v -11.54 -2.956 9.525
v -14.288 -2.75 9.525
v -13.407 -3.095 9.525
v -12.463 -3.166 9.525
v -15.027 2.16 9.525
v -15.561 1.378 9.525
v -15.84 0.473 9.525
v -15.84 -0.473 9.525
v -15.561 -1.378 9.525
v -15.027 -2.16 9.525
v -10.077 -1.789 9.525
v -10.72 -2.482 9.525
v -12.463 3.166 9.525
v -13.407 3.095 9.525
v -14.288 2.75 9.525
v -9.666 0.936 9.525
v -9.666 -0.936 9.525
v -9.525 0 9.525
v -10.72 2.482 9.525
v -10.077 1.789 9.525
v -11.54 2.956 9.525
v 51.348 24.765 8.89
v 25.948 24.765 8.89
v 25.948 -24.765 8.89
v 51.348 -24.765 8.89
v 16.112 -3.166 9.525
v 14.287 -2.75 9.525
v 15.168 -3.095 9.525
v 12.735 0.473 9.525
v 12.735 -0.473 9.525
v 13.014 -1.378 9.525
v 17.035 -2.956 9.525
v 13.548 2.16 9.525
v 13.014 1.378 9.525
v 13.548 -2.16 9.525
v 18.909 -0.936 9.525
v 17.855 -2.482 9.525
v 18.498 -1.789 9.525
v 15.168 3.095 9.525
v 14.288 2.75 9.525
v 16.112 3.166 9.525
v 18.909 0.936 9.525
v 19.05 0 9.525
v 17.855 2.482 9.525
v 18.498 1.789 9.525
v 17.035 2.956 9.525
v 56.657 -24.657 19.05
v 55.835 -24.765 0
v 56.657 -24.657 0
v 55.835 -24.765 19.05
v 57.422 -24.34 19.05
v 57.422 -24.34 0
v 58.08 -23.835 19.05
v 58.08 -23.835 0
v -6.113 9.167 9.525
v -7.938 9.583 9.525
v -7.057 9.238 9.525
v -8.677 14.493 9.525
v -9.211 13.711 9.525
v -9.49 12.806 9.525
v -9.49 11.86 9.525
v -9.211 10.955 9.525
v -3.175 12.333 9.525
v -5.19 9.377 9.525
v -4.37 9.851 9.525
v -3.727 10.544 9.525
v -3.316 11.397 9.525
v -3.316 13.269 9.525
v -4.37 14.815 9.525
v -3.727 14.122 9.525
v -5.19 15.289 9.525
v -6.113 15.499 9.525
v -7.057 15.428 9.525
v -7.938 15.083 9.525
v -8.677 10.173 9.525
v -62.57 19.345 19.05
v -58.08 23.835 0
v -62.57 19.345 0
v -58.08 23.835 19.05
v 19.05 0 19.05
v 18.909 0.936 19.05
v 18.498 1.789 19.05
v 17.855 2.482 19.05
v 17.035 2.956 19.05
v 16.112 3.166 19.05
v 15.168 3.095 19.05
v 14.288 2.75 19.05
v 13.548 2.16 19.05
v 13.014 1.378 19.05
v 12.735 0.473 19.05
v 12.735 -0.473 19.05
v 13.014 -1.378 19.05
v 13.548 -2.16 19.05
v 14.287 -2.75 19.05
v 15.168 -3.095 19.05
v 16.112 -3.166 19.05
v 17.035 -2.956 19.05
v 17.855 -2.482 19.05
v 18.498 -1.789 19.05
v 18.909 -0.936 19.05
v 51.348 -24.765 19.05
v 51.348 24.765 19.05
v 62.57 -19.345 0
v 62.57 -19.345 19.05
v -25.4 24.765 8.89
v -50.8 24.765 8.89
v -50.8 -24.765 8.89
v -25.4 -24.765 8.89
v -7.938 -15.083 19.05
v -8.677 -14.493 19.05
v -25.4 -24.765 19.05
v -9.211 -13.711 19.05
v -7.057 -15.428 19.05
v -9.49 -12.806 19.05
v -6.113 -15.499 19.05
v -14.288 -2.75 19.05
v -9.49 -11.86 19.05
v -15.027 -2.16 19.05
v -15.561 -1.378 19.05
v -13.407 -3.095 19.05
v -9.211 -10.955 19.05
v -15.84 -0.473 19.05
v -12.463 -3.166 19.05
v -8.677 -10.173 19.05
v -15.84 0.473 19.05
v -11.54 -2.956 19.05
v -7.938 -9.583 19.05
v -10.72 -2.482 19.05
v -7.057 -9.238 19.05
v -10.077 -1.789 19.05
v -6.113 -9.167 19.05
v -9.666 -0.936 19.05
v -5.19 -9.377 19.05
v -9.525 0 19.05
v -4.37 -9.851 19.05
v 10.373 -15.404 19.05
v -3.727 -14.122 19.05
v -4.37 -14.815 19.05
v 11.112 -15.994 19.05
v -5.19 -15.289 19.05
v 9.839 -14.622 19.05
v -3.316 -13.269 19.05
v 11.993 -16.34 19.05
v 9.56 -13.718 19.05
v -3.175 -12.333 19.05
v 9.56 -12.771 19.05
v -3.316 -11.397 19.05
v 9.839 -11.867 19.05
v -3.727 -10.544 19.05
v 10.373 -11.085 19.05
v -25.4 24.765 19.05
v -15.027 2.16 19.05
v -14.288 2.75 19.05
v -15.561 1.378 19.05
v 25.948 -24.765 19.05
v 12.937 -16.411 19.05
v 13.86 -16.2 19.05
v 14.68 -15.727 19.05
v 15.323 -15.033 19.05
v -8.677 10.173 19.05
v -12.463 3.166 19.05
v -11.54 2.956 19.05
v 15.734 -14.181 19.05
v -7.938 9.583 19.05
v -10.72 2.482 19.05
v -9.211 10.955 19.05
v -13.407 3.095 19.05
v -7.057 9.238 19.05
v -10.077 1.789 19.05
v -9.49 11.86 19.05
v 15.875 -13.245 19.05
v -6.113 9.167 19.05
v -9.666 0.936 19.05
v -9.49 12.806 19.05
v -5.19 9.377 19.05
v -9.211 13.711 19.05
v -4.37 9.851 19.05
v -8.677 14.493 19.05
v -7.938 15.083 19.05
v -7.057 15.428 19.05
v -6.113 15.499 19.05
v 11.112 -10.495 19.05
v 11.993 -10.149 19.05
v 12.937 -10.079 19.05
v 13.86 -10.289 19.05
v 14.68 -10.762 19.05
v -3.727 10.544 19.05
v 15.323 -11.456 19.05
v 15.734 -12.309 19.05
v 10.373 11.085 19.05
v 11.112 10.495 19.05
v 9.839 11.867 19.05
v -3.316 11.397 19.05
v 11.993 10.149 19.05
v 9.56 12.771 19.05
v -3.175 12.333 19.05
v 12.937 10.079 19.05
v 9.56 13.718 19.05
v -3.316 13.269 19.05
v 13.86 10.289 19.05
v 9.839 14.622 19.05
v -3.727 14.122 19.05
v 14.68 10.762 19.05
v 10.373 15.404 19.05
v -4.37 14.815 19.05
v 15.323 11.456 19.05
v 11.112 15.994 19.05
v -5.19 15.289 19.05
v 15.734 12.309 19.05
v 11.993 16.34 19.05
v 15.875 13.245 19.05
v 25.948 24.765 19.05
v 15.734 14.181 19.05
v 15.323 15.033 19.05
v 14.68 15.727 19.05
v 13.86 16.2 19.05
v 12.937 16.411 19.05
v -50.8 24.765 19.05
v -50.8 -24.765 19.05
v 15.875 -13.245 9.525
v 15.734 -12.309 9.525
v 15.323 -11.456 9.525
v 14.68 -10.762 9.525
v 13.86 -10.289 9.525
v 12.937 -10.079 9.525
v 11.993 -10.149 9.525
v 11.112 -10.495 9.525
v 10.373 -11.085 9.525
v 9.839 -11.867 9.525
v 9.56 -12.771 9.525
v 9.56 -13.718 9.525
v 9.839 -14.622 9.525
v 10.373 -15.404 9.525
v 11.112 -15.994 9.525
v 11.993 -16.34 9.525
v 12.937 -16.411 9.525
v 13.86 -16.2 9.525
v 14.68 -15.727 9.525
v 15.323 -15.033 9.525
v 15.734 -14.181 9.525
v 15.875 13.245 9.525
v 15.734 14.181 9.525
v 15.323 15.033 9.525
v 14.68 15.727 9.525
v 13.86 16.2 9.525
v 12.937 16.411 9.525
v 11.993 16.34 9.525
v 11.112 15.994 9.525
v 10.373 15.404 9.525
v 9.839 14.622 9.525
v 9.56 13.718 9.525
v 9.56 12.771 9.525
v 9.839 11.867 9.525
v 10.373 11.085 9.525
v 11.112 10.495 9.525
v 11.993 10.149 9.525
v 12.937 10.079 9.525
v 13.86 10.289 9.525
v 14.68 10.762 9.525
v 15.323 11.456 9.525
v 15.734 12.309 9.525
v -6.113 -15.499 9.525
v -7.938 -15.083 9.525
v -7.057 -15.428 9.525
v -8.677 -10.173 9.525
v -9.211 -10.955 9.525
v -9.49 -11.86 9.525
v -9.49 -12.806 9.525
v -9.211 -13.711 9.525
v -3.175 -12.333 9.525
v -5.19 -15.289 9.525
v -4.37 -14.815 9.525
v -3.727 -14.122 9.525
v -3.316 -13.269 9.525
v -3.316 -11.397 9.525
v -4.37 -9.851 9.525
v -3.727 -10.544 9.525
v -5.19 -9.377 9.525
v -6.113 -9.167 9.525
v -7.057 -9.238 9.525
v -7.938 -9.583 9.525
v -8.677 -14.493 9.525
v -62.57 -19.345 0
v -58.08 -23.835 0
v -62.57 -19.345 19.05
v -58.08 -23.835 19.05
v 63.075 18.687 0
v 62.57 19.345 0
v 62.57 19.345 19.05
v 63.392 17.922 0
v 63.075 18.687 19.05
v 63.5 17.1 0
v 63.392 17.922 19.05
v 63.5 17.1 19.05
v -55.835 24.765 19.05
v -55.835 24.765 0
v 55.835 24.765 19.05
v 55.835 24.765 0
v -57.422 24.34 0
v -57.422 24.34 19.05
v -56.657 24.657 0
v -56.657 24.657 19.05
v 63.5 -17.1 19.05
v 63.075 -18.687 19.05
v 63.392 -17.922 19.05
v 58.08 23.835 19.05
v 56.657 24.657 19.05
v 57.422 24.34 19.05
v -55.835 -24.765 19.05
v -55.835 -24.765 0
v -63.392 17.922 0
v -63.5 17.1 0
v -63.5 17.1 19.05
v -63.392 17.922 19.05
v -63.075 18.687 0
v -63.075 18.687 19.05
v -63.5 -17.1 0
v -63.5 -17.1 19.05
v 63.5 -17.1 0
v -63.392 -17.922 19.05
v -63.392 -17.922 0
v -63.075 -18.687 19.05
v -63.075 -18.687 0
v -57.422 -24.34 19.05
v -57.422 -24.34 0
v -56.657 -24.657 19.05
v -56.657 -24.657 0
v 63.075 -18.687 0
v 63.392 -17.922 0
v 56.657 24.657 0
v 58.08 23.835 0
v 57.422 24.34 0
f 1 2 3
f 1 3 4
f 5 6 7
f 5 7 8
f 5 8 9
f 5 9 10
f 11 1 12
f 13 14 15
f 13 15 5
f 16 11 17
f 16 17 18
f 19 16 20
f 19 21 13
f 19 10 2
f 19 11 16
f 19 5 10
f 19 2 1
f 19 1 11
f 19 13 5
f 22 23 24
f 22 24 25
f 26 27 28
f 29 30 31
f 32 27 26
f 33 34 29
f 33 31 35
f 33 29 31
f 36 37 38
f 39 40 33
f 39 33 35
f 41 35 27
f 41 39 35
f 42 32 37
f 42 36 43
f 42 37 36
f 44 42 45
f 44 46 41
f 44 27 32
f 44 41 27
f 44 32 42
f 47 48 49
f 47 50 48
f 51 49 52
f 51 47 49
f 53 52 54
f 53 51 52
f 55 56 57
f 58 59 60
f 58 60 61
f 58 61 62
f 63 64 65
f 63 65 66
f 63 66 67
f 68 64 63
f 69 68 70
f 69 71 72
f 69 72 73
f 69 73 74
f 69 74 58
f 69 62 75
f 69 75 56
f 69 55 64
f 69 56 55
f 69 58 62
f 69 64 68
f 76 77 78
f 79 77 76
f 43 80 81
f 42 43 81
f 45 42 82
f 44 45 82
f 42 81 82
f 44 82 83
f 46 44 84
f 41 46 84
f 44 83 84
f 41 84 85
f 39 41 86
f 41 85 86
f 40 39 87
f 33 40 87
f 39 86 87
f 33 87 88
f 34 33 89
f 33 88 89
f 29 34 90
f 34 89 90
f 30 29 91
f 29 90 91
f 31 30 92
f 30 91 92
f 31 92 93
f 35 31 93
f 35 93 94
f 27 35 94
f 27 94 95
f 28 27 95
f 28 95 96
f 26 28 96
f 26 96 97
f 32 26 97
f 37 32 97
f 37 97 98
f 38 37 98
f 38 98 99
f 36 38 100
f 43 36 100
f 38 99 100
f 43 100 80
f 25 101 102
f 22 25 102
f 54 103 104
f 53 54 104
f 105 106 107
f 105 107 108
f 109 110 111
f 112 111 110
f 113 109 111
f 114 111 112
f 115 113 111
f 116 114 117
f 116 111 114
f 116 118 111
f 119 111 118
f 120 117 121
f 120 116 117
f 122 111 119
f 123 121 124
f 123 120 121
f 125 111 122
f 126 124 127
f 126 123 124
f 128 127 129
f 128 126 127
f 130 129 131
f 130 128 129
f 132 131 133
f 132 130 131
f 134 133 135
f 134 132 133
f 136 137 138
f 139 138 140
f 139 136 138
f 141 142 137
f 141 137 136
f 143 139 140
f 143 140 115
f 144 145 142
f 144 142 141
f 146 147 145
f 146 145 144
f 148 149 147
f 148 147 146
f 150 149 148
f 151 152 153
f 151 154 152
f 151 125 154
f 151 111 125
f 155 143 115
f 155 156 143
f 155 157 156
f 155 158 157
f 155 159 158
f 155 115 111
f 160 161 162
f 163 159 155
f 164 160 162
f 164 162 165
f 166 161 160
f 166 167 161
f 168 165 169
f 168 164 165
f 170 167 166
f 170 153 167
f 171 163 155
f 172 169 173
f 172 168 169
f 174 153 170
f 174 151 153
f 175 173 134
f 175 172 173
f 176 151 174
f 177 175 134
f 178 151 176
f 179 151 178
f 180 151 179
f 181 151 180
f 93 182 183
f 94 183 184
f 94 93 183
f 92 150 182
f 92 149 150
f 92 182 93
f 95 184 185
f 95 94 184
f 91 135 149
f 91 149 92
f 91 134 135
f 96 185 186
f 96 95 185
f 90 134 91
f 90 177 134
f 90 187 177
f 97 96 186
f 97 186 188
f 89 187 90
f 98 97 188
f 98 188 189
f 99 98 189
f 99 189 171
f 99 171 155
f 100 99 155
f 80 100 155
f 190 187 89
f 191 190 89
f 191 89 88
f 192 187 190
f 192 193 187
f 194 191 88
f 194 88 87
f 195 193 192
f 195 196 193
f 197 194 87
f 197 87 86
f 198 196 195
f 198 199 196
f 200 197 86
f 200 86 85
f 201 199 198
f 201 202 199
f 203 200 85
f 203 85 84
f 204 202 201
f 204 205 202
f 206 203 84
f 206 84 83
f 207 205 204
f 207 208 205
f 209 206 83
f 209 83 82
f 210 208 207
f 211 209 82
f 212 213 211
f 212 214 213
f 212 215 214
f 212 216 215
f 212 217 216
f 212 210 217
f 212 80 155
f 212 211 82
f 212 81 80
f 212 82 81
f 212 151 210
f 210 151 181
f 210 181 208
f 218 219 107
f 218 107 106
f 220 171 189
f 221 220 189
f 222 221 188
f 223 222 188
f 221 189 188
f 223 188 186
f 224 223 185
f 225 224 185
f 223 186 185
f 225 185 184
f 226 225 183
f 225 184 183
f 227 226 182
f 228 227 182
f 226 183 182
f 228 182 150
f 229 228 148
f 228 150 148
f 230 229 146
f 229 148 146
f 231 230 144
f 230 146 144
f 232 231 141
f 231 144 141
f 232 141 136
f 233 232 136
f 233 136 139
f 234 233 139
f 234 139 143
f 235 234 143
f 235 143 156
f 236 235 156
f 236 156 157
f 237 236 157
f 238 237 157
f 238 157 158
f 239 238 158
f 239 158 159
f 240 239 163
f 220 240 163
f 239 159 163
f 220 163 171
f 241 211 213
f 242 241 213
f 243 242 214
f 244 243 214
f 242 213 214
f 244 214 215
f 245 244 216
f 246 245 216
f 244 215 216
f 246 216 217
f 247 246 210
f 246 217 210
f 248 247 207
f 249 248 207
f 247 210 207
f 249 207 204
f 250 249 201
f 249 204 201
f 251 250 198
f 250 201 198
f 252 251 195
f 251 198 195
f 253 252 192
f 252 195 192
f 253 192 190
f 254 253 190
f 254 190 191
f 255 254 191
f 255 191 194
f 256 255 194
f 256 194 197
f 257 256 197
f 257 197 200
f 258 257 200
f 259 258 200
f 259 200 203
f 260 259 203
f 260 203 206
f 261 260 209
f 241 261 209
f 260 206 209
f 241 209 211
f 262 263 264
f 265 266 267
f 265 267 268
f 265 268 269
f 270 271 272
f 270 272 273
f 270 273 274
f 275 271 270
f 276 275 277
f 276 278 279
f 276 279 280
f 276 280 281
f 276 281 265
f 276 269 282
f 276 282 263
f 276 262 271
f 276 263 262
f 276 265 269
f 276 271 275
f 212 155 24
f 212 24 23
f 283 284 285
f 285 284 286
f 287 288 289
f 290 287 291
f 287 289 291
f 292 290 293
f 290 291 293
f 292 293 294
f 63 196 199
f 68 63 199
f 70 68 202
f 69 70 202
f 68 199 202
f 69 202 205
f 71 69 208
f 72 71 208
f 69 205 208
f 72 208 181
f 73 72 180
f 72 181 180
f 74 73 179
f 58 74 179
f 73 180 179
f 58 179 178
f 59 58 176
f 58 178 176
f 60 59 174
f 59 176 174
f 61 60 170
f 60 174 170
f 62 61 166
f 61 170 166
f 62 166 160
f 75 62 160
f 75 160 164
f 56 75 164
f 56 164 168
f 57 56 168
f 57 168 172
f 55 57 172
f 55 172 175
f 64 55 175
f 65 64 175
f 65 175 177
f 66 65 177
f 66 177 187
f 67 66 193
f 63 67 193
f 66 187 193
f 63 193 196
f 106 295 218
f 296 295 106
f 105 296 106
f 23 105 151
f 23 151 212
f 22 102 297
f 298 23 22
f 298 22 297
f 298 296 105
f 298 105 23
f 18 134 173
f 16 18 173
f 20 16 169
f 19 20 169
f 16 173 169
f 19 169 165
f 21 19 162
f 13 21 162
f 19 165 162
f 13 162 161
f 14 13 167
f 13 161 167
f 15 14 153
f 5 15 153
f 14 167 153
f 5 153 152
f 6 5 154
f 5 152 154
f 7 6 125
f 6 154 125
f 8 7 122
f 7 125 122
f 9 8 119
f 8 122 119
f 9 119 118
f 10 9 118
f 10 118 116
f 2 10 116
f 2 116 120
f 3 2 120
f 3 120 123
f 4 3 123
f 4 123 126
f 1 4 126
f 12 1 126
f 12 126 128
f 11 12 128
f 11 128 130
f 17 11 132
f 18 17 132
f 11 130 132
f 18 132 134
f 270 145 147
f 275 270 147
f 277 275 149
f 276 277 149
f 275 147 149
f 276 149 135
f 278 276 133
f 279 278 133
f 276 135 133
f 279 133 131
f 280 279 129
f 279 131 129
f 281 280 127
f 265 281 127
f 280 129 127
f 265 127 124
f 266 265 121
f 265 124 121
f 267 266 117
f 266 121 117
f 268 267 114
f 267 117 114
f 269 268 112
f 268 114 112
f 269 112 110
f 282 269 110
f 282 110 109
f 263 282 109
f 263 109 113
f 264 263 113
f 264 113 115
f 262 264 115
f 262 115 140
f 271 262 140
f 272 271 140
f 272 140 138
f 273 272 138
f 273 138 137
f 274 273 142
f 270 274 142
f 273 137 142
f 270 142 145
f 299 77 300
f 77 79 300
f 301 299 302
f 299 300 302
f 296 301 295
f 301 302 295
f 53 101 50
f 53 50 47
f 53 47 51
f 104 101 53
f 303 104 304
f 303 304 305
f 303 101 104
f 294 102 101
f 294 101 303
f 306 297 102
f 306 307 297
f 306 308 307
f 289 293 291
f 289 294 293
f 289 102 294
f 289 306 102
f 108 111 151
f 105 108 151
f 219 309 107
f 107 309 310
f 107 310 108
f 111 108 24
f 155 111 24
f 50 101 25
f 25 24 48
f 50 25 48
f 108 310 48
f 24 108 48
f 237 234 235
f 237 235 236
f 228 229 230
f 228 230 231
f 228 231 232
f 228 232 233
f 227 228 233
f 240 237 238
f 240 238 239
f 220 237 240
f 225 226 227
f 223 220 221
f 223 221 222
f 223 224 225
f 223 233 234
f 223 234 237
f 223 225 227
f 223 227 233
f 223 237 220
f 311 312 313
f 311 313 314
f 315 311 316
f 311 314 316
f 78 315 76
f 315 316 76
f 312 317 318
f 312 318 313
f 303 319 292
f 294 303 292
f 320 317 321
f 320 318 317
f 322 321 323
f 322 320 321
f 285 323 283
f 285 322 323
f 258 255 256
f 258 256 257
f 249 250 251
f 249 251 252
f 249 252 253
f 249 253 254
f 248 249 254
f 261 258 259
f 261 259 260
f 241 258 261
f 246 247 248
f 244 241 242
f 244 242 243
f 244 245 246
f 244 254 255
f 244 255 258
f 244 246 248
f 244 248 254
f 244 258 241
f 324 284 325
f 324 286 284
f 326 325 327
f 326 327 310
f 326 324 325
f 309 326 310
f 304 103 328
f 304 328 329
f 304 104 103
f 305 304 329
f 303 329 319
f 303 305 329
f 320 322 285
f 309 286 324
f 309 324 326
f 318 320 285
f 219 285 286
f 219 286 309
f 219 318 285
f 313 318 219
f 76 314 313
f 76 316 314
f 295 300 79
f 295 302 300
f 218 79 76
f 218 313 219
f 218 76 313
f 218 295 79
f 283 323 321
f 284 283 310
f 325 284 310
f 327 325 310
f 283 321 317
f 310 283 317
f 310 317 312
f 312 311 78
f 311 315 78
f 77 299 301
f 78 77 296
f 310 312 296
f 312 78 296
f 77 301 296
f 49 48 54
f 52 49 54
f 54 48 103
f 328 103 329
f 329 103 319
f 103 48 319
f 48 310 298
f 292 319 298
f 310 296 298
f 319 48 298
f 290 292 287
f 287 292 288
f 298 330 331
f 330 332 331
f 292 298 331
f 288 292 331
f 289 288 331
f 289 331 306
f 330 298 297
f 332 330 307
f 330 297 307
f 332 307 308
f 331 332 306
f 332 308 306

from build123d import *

# Parameters (mm, degrees)
F0_W     = 127
F0_H     = 49.53
F1_DEPTH = 19.05
F2_W     = 25.4
F2_H     = 49.53
F3_DEPTH = 10.16
F4_DEPTH = 10.16
F2_R     = 3.175
F5_DEPTH = 9.525
F6_SIZE  = 6.35
F7_R     = 3.175


with BuildPart() as f1:
    # F0 (on Top) → F1 (new body)
    with BuildSketch(Plane.XY):
        Rectangle(F0_W, F0_H)
    extrude(amount=F1_DEPTH)

    # F2 (on face) → F3 (cut)
    with BuildSketch(Plane.XY.offset(19.05)):
        with Locations((-38.1, 0)):
            Rectangle(F2_W, F2_H)
    extrude(amount=-F3_DEPTH, mode=Mode.SUBTRACT)

    # F2 (on face) → F4 (cut)
    with BuildSketch(Plane.XY.offset(19.05)):
        with Locations((38.6475931525, 0)):
            Rectangle(F2_W, F2_H)
    extrude(amount=-F4_DEPTH, mode=Mode.SUBTRACT)

    # F2 (on face) → F5 (cut)
    with BuildSketch(Plane.XY.offset(19.05)):
        with Locations((-6.35, -12.3330028728)):
            Circle(F2_R)
        with Locations((-12.7, 0)):
            Circle(F2_R)
        with Locations((-6.35, 12.3330028728)):
            Circle(F2_R)
        with Locations((12.7, 13.2446838543)):
            Circle(F2_R)
        with Locations((15.875, 0)):
            Circle(F2_R)
        with Locations((12.7, -13.2446838543)):
            Circle(F2_R)
    extrude(amount=-F5_DEPTH, mode=Mode.SUBTRACT)

    # F6
    f6_edges = [f1.edges().sort_by_distance(p)[0] for p in [
        (63.5, -24.765, 9.525),
        (63.5, 24.765, 9.525),
        (-63.5, -24.765, 9.525),
        (-63.5, 24.765, 9.525),
    ]]
    chamfer(f6_edges, length=F6_SIZE)

    # F7
    f7_edges = [f1.edges().sort_by_distance(p)[0] for p in [
        (-57.15, -24.765, 9.525),
        (57.15, -24.765, 9.525),
        (63.5, -18.415, 9.525),
        (63.5, 18.415, 9.525),
        (-63.5, -18.415, 9.525),
        (57.15, 24.765, 9.525),
        (-57.15, 24.765, 9.525),
        (-63.5, 18.415, 9.525),
    ]]
    fillet(f7_edges, radius=F7_R)


solid = f1.part
